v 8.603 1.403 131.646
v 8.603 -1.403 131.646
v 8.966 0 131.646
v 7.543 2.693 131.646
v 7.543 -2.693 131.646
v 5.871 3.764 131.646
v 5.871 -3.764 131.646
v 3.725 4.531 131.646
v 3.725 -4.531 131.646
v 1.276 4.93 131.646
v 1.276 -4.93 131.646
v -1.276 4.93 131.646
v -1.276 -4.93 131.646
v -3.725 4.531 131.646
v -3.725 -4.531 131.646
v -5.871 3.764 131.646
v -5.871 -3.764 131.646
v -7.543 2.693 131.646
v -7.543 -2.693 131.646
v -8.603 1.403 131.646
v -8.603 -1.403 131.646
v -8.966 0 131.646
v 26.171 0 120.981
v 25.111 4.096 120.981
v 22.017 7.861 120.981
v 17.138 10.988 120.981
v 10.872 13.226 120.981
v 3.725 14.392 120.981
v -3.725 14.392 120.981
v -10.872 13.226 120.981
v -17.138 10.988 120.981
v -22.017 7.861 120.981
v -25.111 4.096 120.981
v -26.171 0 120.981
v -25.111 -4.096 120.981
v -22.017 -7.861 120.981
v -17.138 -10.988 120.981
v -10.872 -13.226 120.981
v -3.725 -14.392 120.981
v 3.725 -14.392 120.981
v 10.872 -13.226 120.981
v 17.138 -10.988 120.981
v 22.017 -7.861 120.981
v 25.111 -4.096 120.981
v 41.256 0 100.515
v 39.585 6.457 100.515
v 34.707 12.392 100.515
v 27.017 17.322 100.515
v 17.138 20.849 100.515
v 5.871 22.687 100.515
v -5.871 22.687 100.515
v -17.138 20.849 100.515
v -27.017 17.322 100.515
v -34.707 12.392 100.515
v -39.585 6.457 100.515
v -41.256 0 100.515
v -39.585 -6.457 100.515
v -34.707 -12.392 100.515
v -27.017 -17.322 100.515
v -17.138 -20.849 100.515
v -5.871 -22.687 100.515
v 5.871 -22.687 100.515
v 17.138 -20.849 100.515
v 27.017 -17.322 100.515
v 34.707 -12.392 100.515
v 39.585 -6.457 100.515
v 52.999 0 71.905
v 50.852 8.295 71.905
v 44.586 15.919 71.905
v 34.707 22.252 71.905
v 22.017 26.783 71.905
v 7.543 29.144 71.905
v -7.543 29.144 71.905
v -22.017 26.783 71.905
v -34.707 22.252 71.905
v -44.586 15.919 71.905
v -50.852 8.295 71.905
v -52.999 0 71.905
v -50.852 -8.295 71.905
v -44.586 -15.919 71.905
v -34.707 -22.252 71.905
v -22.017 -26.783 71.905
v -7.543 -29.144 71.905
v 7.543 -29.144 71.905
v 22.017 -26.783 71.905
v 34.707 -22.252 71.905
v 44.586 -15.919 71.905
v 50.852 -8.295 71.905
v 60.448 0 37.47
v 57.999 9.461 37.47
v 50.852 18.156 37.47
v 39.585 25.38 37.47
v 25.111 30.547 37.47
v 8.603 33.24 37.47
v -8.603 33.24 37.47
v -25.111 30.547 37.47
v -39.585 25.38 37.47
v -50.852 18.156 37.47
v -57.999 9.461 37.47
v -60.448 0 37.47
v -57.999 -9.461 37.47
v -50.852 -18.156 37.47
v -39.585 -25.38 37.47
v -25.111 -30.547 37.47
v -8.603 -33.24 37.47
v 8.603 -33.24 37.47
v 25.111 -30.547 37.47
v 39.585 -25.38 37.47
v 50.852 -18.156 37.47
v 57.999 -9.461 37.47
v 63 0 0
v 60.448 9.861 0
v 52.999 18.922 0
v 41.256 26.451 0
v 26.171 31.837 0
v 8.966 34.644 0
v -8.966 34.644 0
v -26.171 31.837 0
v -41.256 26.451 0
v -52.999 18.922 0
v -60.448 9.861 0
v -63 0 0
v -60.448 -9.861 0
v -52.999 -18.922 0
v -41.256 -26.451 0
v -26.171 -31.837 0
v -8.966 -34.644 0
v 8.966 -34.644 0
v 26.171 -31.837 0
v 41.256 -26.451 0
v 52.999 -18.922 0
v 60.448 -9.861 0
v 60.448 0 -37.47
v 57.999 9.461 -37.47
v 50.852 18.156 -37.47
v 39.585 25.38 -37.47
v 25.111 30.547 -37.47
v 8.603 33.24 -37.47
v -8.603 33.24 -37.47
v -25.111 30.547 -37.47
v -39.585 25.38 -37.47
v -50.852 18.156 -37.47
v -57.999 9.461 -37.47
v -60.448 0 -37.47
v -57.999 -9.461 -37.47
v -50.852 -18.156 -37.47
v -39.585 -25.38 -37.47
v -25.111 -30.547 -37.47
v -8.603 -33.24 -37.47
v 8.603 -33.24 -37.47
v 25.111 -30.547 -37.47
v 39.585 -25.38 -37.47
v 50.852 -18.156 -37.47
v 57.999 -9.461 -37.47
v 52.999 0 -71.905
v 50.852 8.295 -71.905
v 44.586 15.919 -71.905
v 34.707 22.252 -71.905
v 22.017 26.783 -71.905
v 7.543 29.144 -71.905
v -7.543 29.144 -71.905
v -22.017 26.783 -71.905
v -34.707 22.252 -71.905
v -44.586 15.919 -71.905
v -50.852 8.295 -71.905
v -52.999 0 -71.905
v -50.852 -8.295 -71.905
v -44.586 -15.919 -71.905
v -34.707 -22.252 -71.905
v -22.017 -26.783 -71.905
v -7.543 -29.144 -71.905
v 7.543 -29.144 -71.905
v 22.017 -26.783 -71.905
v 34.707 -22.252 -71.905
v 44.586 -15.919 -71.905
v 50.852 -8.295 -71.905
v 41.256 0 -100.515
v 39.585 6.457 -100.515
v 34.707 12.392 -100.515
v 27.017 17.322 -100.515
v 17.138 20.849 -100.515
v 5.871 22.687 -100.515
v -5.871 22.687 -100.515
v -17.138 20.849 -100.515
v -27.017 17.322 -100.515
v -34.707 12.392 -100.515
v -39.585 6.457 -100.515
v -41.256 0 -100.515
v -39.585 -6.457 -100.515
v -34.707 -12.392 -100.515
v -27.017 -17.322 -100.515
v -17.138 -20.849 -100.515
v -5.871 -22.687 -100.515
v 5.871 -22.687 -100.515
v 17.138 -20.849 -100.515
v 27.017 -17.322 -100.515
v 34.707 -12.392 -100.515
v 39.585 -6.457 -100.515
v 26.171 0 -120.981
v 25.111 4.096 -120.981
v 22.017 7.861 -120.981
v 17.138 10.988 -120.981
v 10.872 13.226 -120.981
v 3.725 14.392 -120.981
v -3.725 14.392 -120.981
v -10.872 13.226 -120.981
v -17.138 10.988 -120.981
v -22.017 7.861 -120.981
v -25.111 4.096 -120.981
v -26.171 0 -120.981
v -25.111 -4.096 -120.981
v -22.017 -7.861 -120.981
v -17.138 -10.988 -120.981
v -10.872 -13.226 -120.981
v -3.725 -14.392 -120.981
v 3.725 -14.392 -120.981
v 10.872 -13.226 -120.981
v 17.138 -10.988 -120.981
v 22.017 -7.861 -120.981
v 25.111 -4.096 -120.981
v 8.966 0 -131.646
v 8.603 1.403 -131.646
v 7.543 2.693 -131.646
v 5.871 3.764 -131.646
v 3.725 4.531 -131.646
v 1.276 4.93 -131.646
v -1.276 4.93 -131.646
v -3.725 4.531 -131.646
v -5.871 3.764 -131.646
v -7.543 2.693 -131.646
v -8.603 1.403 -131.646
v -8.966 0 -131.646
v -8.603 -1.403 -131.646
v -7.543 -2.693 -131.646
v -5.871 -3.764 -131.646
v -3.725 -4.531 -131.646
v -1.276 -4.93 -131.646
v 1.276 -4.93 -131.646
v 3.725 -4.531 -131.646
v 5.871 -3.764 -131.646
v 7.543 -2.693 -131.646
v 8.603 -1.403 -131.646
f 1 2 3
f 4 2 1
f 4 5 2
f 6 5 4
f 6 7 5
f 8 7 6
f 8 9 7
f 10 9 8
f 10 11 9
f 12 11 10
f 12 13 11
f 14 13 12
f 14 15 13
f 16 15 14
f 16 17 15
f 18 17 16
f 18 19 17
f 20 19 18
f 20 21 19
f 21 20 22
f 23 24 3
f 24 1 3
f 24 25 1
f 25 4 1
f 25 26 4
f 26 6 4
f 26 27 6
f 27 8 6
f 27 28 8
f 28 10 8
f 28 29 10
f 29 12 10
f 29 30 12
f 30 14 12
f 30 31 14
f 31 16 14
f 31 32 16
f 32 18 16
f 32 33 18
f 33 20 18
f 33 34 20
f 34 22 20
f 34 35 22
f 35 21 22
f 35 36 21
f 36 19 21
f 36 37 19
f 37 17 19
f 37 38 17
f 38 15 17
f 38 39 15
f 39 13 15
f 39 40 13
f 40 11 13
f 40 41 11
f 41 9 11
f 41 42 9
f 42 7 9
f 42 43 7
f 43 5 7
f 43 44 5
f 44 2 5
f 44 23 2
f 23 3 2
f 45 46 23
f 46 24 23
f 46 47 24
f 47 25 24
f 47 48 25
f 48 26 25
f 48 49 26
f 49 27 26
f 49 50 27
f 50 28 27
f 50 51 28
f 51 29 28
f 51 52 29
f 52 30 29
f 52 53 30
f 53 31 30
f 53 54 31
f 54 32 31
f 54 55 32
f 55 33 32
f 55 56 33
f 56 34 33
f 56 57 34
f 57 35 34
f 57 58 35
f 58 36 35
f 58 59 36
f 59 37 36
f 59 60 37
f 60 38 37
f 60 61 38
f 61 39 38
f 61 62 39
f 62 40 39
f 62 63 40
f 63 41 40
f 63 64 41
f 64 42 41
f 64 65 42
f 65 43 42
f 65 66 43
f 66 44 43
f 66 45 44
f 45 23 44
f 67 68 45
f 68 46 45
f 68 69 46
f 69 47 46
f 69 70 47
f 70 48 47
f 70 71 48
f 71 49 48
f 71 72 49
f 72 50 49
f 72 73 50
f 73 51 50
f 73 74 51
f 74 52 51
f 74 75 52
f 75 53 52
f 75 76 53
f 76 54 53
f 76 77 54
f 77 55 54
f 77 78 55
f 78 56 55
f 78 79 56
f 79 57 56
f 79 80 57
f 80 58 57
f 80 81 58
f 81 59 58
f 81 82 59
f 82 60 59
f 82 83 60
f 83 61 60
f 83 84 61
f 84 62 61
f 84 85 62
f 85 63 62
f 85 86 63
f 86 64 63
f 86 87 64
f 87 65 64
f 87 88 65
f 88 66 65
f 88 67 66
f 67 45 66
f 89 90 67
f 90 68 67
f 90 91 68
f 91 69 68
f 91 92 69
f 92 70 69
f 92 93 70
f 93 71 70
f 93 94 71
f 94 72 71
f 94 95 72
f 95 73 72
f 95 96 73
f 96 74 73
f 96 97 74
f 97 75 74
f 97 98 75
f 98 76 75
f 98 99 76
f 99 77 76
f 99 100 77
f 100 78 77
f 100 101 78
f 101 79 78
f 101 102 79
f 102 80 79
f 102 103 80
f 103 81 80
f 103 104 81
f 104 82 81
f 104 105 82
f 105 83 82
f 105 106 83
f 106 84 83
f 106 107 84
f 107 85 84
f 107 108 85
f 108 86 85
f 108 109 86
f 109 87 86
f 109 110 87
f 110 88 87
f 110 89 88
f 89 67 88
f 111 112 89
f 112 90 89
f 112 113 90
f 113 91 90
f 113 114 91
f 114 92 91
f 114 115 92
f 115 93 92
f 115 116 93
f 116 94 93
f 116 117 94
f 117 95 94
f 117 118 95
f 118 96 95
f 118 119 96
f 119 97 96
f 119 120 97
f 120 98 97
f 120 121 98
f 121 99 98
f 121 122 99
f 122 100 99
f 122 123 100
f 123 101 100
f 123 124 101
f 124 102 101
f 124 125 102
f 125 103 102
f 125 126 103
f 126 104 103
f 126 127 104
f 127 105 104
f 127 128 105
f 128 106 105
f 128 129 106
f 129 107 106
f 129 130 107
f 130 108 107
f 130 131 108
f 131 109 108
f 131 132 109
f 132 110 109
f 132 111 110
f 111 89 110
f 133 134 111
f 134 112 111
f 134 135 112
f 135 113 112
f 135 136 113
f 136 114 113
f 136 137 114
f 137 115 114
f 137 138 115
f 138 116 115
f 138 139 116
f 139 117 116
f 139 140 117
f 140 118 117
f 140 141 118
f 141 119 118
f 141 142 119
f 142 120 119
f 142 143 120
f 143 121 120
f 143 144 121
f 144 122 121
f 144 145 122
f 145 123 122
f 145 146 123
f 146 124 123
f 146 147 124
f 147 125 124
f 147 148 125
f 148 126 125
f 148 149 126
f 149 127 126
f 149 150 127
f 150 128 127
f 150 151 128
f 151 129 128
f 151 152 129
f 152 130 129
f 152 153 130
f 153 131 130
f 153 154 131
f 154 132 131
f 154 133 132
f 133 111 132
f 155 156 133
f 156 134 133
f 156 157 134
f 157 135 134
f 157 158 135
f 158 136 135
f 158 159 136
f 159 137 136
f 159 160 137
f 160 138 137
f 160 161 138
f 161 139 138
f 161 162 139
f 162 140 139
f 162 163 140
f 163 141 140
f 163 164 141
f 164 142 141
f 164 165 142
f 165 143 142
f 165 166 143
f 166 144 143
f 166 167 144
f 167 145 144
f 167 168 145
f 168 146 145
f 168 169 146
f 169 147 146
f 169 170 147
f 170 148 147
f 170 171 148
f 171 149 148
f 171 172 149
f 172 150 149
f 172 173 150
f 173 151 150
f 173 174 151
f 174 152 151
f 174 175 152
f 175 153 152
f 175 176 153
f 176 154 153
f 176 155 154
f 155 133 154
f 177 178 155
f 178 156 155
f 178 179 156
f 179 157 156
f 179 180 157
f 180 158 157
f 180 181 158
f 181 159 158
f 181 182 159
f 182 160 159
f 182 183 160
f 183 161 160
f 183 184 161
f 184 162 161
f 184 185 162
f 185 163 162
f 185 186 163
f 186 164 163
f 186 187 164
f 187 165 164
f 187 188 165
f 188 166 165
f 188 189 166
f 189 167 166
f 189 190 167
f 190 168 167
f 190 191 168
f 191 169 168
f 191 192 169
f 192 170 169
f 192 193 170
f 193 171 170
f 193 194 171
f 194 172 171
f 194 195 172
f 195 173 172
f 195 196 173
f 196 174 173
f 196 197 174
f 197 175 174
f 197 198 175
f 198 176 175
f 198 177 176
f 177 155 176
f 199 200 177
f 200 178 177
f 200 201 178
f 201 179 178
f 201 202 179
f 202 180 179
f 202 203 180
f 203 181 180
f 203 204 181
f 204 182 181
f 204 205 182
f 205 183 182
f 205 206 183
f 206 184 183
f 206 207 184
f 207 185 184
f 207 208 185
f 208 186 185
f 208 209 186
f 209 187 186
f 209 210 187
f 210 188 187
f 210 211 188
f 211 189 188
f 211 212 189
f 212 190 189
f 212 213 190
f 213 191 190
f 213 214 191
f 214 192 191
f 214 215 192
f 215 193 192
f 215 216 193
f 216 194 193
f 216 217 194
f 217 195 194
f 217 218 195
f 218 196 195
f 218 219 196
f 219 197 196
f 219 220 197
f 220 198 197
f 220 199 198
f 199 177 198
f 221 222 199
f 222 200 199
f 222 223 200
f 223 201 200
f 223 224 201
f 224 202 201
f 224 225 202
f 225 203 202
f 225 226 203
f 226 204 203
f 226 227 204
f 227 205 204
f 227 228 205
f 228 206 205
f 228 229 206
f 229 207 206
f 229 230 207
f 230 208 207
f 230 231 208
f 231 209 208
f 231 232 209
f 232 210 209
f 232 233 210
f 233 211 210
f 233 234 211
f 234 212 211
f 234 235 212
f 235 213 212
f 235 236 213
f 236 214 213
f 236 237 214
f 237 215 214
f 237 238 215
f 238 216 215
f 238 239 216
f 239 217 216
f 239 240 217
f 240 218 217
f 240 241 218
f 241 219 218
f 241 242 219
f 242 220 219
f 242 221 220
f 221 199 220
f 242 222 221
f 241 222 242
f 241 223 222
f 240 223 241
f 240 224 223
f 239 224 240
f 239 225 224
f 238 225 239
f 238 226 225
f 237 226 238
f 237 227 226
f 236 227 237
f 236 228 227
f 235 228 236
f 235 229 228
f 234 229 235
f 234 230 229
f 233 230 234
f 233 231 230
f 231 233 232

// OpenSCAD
// Generated by SolidPython 1.0.1 on 2020-07-29 00:46:48


scale(v = [9, 5, 19]) {
	sphere(r = 7);
}
/***********************************************
*********      SolidPython code:      **********
************************************************
 
# import packages: SolidPython
from solid import *
from solid.utils import *
from itertools import chain, combinations, permutations


class Resize:

    def __init__(self, scad_file):
        self.scad_file = scad_file
        #self.scad_file = import_scad(scad_file)
        # cone/cylinder param:
        self.r1 = 0
        self.r2 = 0
        self.h = 0
        # rectangular prism param:
        self.w = 0
        self.l = 0
        # ellipse param:
        self.r = 0

    # import OpenScad code (file name corresponds to shape)


    # classify shape + parameters
    def assign(self, param1, param2, param3):
        if self.scad_file == 'cone.scad':
            self.r1 = param1
            self.r2 = param2
            self.h = param3
        elif self.scad_file == 'cylinder.scad':
            self.r1 = param1
            self.r2 = param2
            self.h = param3
        elif self.scad_file == 'rectangularPrism.scad':
            self.h = param1
            self.l = param2
            self.w = param3
        else:
            self.r = param1
            self.h = param2

    # resize parameters
    def iterate(self):
        x = range(3, 20, 2)
        i = 1
        if self.scad_file == 'cone.scad':
            tempList = list(permutations(x, 2))
            for temp in tempList:
                param1 = temp[0]
                param2 = temp[1]
                filepath = 'produced_scad_files/' + 'cone' + str(param1) + '_' + str(param2) + '_' + '.scad'
                scad_render_to_file(cylinder(h=param1, r1=param2, r2=0), filepath)

        elif self.scad_file == 'cylinder.scad':
            tempList = list(permutations(x, 3))
            for temp in tempList:
                param1 = temp[0]
                param2 = temp[1]
                filepath = 'produced_scad_files/' + 'cylinder' + str(param1) + '_' + str(param2) + '_' + '.scad'
                scad_render_to_file(cylinder(h=param1, r1=param2, r2=param2), filepath)

        elif self.scad_file == 'rectangularPrism.scad':
            tempList = list(permutations(x, 3))
            for temp in tempList:
                param1 = temp[0]
                param2 = temp[1]
                param3 = temp[2]
                filepath = 'produced_scad_files/' + 'rectangularPrism' + str(param1) + '_' + str(param2) + '_' + str(
                    param3) + '.scad'
                scad_render_to_file(cube(size=(param1, param2, param3)), filepath)

        elif self.scad_file == 'ellipse.scad':
            tempList = list(permutations(x, 4))
            for temp in tempList:
                param1 = temp[0]
                param2 = temp[1]
                param3 = temp[2]
                param4 = temp[3]
                filepath = 'produced_scad_files/' + 'ellipse' + str(param1) + '_' + str(param2) + '_' + str(param3) + '_' + str(param4) + '.scad'
                scad_render_to_file(scale([param1, param2, param3])(sphere(r=param4)), filepath)

    def render_to_scadfile(self):
        scad_render_to_file(scad, 'example.scad') 
 
************************************************/
